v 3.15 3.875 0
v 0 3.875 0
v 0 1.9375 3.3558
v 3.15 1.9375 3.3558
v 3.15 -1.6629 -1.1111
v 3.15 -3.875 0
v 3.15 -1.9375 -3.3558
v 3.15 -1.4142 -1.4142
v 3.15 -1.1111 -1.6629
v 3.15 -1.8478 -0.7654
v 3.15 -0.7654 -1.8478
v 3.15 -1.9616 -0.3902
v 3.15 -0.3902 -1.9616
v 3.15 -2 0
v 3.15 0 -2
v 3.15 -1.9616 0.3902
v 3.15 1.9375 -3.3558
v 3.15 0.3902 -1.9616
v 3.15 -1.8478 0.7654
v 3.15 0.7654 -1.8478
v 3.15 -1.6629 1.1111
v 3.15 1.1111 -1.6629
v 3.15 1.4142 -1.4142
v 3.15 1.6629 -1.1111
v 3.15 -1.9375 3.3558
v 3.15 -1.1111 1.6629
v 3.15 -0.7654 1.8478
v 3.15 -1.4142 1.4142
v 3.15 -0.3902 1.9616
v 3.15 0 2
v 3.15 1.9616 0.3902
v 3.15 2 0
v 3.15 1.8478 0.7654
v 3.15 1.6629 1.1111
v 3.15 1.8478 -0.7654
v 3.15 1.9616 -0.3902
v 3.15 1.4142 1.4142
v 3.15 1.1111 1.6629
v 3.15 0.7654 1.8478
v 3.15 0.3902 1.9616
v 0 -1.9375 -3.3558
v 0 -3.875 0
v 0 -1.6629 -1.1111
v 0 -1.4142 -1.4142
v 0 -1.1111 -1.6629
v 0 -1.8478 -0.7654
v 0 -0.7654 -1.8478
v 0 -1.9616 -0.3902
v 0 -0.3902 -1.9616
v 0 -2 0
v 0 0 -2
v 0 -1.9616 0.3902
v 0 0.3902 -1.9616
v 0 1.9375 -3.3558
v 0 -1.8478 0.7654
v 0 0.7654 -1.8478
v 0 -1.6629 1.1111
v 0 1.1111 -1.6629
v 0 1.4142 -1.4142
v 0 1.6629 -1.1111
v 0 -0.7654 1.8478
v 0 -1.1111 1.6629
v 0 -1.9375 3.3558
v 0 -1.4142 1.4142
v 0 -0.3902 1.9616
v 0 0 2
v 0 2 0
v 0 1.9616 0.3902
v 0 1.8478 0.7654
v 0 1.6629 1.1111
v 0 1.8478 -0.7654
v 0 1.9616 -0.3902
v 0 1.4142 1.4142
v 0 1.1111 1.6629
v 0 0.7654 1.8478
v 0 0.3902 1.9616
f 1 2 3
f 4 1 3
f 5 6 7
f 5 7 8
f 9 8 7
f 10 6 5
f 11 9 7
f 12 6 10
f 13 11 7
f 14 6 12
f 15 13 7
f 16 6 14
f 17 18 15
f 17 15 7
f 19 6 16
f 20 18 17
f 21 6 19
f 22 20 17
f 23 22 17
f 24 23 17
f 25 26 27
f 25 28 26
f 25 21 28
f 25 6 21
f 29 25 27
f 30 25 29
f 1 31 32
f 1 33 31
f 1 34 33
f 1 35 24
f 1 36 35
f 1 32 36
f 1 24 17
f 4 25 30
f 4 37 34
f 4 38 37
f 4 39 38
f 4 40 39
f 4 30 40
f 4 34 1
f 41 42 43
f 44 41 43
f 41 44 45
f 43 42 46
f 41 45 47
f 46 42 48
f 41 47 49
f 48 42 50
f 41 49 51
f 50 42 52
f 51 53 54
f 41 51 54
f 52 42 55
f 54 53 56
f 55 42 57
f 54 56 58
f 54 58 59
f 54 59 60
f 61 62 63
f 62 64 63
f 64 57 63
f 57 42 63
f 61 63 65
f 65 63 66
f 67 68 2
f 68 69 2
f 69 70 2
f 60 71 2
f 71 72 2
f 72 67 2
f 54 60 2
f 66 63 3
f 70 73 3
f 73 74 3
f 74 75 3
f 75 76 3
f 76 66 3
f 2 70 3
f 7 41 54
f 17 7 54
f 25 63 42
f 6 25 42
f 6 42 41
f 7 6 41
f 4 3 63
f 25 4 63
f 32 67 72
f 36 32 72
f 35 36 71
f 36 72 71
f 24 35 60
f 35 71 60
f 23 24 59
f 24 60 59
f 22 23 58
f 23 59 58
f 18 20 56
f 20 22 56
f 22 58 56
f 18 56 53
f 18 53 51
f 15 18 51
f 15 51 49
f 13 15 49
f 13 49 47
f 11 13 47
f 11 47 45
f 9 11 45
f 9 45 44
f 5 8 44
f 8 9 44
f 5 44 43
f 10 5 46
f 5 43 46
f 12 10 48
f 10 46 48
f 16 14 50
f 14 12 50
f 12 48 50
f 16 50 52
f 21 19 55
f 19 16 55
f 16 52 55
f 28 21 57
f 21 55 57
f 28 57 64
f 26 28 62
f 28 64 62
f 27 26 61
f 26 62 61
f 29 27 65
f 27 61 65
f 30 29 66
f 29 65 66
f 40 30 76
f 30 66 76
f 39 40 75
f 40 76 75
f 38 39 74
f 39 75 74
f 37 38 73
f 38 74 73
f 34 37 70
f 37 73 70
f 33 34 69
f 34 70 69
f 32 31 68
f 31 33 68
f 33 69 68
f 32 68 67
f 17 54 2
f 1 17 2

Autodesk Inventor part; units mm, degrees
ref_plane "YZ Plane" through (0, 0, 0) normal (1, 0, 0) x (0, 1, 0)
ref_plane "XZ Plane" through (0, 0, 0) normal (0, 1, 0) x (-1, 0, 0)
ref_plane "XY Plane" through (0, 0, 0) normal (0, 0, 1) x (1, 0, 0)
sketch "スケッチ1" plane through (0, 0, 0) normal (1, 0, 0) x (0, 1, 0)
  circle A0 centre (0, 0) radius 2
  line L0 (3.875, 0) -> (1.9375, 3.3558)
  line L1 (1.9375, 3.3558) -> (-1.9375, 3.3558)
  line L2 (-1.9375, 3.3558) -> (-3.875, 0)
  line L3 (-3.875, 0) -> (-1.9375, -3.3558)
  line L4 (-1.9375, -3.3558) -> (1.9375, -3.3558)
  line L5 (1.9375, -3.3558) -> (3.875, 0)
  dimension "d0" = 4
  dimension "d1" = 3.875
  dimension "d4" = 360
extrude "押し出し1" add sketch "スケッチ1" along normal blind 3.15
properties part number "4min-nut" material "アルミニウム 6061"
